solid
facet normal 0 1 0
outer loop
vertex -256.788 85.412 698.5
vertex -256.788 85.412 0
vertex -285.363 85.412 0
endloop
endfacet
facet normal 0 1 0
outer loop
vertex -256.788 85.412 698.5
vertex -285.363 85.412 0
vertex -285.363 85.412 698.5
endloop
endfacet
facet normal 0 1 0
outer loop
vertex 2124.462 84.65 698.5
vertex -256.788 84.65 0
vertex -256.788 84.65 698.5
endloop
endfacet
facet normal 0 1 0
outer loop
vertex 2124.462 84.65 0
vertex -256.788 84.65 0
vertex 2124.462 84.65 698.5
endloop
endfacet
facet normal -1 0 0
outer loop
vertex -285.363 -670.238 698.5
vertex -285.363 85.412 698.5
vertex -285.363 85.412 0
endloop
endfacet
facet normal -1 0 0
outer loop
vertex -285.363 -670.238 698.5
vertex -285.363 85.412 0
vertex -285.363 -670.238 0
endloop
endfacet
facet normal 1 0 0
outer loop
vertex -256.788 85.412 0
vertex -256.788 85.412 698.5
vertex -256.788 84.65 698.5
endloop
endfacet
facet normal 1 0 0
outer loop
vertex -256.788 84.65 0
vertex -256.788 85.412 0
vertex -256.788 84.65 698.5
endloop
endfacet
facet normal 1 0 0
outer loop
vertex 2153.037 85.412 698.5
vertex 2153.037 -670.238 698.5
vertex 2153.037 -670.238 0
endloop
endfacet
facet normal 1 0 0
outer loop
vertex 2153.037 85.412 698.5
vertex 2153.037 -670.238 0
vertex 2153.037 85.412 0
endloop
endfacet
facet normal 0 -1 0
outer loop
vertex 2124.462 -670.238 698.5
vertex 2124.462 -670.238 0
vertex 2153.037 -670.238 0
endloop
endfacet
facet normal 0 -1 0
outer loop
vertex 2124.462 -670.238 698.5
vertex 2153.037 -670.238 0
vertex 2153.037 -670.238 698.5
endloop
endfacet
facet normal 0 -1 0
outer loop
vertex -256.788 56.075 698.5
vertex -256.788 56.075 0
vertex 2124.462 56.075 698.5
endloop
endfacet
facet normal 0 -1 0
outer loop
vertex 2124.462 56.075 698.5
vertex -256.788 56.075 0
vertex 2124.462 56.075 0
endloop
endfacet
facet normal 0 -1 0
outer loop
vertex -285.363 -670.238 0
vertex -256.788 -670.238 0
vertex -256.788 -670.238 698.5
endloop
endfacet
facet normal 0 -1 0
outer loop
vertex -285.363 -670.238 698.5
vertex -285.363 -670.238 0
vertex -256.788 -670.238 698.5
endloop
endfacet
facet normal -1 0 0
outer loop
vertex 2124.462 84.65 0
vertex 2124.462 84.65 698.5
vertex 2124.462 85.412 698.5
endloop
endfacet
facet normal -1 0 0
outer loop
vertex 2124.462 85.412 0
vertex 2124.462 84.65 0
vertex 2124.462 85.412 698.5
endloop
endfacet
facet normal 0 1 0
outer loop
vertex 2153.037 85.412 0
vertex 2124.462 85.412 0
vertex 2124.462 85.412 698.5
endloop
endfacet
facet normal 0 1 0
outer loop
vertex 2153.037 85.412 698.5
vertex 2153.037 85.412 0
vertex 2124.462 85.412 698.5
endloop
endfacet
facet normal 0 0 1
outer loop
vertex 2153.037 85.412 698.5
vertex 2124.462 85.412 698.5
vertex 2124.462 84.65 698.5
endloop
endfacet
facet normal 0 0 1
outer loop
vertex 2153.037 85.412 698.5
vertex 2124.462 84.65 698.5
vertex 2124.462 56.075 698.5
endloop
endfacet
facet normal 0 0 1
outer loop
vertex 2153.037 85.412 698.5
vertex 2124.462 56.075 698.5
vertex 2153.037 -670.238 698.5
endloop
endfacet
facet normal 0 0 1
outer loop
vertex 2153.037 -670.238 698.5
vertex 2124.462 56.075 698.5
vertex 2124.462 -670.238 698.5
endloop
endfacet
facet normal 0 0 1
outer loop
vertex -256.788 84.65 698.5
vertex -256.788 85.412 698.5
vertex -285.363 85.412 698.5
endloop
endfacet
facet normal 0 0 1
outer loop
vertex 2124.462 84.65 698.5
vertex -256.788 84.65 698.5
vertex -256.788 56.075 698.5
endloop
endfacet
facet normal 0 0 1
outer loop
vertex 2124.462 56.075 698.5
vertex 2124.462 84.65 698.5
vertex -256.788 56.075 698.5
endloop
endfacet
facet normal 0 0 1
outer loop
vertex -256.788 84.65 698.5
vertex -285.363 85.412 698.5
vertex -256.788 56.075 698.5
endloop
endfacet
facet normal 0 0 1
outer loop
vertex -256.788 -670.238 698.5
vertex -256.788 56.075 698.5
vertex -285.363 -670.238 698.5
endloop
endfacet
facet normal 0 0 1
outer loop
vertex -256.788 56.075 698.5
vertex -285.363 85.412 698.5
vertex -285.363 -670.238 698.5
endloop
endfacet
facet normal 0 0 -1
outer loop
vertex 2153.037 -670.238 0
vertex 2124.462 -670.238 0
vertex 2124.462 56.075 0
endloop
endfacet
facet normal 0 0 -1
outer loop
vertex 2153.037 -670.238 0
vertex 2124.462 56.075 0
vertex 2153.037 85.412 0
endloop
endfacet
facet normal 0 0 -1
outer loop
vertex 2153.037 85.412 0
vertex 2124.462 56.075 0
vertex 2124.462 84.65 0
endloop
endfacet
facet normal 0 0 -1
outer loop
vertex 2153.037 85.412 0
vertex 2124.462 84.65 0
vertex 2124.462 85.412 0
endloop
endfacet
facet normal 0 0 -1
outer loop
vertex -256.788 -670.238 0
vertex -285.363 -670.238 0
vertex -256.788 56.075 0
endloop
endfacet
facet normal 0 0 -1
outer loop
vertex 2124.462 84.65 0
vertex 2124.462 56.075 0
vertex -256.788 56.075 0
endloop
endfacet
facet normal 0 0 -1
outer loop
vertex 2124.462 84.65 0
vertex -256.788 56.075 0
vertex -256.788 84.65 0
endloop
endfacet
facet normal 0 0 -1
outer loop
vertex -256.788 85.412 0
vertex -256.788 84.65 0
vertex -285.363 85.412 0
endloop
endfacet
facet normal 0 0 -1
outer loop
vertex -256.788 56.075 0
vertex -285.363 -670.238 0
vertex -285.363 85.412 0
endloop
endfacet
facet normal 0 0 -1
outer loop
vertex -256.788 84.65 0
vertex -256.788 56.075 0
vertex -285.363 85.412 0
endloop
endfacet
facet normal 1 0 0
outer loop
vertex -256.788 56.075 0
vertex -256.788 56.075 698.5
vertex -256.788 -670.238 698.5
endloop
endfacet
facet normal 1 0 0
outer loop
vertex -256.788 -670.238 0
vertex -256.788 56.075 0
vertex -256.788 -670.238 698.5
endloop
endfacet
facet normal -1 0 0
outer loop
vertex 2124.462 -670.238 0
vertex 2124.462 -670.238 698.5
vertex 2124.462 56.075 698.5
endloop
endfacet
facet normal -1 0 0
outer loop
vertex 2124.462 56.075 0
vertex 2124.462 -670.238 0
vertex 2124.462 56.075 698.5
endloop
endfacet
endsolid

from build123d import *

# Parameters (mm, degrees)
F0_W     = 2381.25
F0_H     = 28.575
F1_DEPTH = 698.5
F3_W     = 0.762
F3_H     = 698.5
F3_W_2   = 28.575
F3_W_3   = 726.313
F4_DEPTH = 28.575
F2_W     = 726.313
F2_H     = 698.5
F2_W_2   = 28.575
F2_W_3   = 0.762
F5_DEPTH = 28.575


with BuildPart() as f1:
    # F0 (on Top) → F1 (new body)
    with BuildSketch(Plane.XY):
        with Locations((933.8365292177, 70.3620000839)):
            Rectangle(F0_W, F0_H)
    extrude(amount=F1_DEPTH)

    # F3 (on face) → F4 (join)
    with BuildSketch(Plane(origin=(-256.7884707823, 0, 0), x_dir=(0, -1, 0), z_dir=(-1, 0, 0))):
        with Locations((-85.0305000839, 349.25)):
            Rectangle(F3_W, F3_H)
        with Locations((-70.3620000839, 349.25)):
            Rectangle(F3_W_2, F3_H)
        with Locations((307.0819999161, 349.25)):
            Rectangle(F3_W_3, F3_H)
    extrude(amount=F4_DEPTH)

    # F2 (on face) → F5 (join)
    with BuildSketch(Plane.YZ.offset(2124.4615292177)):
        with Locations((-307.0819999161, 349.25)):
            Rectangle(F2_W, F2_H)
        with Locations((70.3620000839, 349.25)):
            Rectangle(F2_W_2, F2_H)
        with Locations((85.0305000839, 349.25)):
            Rectangle(F2_W_3, F2_H)
    extrude(amount=F5_DEPTH)


solid = f1.part
